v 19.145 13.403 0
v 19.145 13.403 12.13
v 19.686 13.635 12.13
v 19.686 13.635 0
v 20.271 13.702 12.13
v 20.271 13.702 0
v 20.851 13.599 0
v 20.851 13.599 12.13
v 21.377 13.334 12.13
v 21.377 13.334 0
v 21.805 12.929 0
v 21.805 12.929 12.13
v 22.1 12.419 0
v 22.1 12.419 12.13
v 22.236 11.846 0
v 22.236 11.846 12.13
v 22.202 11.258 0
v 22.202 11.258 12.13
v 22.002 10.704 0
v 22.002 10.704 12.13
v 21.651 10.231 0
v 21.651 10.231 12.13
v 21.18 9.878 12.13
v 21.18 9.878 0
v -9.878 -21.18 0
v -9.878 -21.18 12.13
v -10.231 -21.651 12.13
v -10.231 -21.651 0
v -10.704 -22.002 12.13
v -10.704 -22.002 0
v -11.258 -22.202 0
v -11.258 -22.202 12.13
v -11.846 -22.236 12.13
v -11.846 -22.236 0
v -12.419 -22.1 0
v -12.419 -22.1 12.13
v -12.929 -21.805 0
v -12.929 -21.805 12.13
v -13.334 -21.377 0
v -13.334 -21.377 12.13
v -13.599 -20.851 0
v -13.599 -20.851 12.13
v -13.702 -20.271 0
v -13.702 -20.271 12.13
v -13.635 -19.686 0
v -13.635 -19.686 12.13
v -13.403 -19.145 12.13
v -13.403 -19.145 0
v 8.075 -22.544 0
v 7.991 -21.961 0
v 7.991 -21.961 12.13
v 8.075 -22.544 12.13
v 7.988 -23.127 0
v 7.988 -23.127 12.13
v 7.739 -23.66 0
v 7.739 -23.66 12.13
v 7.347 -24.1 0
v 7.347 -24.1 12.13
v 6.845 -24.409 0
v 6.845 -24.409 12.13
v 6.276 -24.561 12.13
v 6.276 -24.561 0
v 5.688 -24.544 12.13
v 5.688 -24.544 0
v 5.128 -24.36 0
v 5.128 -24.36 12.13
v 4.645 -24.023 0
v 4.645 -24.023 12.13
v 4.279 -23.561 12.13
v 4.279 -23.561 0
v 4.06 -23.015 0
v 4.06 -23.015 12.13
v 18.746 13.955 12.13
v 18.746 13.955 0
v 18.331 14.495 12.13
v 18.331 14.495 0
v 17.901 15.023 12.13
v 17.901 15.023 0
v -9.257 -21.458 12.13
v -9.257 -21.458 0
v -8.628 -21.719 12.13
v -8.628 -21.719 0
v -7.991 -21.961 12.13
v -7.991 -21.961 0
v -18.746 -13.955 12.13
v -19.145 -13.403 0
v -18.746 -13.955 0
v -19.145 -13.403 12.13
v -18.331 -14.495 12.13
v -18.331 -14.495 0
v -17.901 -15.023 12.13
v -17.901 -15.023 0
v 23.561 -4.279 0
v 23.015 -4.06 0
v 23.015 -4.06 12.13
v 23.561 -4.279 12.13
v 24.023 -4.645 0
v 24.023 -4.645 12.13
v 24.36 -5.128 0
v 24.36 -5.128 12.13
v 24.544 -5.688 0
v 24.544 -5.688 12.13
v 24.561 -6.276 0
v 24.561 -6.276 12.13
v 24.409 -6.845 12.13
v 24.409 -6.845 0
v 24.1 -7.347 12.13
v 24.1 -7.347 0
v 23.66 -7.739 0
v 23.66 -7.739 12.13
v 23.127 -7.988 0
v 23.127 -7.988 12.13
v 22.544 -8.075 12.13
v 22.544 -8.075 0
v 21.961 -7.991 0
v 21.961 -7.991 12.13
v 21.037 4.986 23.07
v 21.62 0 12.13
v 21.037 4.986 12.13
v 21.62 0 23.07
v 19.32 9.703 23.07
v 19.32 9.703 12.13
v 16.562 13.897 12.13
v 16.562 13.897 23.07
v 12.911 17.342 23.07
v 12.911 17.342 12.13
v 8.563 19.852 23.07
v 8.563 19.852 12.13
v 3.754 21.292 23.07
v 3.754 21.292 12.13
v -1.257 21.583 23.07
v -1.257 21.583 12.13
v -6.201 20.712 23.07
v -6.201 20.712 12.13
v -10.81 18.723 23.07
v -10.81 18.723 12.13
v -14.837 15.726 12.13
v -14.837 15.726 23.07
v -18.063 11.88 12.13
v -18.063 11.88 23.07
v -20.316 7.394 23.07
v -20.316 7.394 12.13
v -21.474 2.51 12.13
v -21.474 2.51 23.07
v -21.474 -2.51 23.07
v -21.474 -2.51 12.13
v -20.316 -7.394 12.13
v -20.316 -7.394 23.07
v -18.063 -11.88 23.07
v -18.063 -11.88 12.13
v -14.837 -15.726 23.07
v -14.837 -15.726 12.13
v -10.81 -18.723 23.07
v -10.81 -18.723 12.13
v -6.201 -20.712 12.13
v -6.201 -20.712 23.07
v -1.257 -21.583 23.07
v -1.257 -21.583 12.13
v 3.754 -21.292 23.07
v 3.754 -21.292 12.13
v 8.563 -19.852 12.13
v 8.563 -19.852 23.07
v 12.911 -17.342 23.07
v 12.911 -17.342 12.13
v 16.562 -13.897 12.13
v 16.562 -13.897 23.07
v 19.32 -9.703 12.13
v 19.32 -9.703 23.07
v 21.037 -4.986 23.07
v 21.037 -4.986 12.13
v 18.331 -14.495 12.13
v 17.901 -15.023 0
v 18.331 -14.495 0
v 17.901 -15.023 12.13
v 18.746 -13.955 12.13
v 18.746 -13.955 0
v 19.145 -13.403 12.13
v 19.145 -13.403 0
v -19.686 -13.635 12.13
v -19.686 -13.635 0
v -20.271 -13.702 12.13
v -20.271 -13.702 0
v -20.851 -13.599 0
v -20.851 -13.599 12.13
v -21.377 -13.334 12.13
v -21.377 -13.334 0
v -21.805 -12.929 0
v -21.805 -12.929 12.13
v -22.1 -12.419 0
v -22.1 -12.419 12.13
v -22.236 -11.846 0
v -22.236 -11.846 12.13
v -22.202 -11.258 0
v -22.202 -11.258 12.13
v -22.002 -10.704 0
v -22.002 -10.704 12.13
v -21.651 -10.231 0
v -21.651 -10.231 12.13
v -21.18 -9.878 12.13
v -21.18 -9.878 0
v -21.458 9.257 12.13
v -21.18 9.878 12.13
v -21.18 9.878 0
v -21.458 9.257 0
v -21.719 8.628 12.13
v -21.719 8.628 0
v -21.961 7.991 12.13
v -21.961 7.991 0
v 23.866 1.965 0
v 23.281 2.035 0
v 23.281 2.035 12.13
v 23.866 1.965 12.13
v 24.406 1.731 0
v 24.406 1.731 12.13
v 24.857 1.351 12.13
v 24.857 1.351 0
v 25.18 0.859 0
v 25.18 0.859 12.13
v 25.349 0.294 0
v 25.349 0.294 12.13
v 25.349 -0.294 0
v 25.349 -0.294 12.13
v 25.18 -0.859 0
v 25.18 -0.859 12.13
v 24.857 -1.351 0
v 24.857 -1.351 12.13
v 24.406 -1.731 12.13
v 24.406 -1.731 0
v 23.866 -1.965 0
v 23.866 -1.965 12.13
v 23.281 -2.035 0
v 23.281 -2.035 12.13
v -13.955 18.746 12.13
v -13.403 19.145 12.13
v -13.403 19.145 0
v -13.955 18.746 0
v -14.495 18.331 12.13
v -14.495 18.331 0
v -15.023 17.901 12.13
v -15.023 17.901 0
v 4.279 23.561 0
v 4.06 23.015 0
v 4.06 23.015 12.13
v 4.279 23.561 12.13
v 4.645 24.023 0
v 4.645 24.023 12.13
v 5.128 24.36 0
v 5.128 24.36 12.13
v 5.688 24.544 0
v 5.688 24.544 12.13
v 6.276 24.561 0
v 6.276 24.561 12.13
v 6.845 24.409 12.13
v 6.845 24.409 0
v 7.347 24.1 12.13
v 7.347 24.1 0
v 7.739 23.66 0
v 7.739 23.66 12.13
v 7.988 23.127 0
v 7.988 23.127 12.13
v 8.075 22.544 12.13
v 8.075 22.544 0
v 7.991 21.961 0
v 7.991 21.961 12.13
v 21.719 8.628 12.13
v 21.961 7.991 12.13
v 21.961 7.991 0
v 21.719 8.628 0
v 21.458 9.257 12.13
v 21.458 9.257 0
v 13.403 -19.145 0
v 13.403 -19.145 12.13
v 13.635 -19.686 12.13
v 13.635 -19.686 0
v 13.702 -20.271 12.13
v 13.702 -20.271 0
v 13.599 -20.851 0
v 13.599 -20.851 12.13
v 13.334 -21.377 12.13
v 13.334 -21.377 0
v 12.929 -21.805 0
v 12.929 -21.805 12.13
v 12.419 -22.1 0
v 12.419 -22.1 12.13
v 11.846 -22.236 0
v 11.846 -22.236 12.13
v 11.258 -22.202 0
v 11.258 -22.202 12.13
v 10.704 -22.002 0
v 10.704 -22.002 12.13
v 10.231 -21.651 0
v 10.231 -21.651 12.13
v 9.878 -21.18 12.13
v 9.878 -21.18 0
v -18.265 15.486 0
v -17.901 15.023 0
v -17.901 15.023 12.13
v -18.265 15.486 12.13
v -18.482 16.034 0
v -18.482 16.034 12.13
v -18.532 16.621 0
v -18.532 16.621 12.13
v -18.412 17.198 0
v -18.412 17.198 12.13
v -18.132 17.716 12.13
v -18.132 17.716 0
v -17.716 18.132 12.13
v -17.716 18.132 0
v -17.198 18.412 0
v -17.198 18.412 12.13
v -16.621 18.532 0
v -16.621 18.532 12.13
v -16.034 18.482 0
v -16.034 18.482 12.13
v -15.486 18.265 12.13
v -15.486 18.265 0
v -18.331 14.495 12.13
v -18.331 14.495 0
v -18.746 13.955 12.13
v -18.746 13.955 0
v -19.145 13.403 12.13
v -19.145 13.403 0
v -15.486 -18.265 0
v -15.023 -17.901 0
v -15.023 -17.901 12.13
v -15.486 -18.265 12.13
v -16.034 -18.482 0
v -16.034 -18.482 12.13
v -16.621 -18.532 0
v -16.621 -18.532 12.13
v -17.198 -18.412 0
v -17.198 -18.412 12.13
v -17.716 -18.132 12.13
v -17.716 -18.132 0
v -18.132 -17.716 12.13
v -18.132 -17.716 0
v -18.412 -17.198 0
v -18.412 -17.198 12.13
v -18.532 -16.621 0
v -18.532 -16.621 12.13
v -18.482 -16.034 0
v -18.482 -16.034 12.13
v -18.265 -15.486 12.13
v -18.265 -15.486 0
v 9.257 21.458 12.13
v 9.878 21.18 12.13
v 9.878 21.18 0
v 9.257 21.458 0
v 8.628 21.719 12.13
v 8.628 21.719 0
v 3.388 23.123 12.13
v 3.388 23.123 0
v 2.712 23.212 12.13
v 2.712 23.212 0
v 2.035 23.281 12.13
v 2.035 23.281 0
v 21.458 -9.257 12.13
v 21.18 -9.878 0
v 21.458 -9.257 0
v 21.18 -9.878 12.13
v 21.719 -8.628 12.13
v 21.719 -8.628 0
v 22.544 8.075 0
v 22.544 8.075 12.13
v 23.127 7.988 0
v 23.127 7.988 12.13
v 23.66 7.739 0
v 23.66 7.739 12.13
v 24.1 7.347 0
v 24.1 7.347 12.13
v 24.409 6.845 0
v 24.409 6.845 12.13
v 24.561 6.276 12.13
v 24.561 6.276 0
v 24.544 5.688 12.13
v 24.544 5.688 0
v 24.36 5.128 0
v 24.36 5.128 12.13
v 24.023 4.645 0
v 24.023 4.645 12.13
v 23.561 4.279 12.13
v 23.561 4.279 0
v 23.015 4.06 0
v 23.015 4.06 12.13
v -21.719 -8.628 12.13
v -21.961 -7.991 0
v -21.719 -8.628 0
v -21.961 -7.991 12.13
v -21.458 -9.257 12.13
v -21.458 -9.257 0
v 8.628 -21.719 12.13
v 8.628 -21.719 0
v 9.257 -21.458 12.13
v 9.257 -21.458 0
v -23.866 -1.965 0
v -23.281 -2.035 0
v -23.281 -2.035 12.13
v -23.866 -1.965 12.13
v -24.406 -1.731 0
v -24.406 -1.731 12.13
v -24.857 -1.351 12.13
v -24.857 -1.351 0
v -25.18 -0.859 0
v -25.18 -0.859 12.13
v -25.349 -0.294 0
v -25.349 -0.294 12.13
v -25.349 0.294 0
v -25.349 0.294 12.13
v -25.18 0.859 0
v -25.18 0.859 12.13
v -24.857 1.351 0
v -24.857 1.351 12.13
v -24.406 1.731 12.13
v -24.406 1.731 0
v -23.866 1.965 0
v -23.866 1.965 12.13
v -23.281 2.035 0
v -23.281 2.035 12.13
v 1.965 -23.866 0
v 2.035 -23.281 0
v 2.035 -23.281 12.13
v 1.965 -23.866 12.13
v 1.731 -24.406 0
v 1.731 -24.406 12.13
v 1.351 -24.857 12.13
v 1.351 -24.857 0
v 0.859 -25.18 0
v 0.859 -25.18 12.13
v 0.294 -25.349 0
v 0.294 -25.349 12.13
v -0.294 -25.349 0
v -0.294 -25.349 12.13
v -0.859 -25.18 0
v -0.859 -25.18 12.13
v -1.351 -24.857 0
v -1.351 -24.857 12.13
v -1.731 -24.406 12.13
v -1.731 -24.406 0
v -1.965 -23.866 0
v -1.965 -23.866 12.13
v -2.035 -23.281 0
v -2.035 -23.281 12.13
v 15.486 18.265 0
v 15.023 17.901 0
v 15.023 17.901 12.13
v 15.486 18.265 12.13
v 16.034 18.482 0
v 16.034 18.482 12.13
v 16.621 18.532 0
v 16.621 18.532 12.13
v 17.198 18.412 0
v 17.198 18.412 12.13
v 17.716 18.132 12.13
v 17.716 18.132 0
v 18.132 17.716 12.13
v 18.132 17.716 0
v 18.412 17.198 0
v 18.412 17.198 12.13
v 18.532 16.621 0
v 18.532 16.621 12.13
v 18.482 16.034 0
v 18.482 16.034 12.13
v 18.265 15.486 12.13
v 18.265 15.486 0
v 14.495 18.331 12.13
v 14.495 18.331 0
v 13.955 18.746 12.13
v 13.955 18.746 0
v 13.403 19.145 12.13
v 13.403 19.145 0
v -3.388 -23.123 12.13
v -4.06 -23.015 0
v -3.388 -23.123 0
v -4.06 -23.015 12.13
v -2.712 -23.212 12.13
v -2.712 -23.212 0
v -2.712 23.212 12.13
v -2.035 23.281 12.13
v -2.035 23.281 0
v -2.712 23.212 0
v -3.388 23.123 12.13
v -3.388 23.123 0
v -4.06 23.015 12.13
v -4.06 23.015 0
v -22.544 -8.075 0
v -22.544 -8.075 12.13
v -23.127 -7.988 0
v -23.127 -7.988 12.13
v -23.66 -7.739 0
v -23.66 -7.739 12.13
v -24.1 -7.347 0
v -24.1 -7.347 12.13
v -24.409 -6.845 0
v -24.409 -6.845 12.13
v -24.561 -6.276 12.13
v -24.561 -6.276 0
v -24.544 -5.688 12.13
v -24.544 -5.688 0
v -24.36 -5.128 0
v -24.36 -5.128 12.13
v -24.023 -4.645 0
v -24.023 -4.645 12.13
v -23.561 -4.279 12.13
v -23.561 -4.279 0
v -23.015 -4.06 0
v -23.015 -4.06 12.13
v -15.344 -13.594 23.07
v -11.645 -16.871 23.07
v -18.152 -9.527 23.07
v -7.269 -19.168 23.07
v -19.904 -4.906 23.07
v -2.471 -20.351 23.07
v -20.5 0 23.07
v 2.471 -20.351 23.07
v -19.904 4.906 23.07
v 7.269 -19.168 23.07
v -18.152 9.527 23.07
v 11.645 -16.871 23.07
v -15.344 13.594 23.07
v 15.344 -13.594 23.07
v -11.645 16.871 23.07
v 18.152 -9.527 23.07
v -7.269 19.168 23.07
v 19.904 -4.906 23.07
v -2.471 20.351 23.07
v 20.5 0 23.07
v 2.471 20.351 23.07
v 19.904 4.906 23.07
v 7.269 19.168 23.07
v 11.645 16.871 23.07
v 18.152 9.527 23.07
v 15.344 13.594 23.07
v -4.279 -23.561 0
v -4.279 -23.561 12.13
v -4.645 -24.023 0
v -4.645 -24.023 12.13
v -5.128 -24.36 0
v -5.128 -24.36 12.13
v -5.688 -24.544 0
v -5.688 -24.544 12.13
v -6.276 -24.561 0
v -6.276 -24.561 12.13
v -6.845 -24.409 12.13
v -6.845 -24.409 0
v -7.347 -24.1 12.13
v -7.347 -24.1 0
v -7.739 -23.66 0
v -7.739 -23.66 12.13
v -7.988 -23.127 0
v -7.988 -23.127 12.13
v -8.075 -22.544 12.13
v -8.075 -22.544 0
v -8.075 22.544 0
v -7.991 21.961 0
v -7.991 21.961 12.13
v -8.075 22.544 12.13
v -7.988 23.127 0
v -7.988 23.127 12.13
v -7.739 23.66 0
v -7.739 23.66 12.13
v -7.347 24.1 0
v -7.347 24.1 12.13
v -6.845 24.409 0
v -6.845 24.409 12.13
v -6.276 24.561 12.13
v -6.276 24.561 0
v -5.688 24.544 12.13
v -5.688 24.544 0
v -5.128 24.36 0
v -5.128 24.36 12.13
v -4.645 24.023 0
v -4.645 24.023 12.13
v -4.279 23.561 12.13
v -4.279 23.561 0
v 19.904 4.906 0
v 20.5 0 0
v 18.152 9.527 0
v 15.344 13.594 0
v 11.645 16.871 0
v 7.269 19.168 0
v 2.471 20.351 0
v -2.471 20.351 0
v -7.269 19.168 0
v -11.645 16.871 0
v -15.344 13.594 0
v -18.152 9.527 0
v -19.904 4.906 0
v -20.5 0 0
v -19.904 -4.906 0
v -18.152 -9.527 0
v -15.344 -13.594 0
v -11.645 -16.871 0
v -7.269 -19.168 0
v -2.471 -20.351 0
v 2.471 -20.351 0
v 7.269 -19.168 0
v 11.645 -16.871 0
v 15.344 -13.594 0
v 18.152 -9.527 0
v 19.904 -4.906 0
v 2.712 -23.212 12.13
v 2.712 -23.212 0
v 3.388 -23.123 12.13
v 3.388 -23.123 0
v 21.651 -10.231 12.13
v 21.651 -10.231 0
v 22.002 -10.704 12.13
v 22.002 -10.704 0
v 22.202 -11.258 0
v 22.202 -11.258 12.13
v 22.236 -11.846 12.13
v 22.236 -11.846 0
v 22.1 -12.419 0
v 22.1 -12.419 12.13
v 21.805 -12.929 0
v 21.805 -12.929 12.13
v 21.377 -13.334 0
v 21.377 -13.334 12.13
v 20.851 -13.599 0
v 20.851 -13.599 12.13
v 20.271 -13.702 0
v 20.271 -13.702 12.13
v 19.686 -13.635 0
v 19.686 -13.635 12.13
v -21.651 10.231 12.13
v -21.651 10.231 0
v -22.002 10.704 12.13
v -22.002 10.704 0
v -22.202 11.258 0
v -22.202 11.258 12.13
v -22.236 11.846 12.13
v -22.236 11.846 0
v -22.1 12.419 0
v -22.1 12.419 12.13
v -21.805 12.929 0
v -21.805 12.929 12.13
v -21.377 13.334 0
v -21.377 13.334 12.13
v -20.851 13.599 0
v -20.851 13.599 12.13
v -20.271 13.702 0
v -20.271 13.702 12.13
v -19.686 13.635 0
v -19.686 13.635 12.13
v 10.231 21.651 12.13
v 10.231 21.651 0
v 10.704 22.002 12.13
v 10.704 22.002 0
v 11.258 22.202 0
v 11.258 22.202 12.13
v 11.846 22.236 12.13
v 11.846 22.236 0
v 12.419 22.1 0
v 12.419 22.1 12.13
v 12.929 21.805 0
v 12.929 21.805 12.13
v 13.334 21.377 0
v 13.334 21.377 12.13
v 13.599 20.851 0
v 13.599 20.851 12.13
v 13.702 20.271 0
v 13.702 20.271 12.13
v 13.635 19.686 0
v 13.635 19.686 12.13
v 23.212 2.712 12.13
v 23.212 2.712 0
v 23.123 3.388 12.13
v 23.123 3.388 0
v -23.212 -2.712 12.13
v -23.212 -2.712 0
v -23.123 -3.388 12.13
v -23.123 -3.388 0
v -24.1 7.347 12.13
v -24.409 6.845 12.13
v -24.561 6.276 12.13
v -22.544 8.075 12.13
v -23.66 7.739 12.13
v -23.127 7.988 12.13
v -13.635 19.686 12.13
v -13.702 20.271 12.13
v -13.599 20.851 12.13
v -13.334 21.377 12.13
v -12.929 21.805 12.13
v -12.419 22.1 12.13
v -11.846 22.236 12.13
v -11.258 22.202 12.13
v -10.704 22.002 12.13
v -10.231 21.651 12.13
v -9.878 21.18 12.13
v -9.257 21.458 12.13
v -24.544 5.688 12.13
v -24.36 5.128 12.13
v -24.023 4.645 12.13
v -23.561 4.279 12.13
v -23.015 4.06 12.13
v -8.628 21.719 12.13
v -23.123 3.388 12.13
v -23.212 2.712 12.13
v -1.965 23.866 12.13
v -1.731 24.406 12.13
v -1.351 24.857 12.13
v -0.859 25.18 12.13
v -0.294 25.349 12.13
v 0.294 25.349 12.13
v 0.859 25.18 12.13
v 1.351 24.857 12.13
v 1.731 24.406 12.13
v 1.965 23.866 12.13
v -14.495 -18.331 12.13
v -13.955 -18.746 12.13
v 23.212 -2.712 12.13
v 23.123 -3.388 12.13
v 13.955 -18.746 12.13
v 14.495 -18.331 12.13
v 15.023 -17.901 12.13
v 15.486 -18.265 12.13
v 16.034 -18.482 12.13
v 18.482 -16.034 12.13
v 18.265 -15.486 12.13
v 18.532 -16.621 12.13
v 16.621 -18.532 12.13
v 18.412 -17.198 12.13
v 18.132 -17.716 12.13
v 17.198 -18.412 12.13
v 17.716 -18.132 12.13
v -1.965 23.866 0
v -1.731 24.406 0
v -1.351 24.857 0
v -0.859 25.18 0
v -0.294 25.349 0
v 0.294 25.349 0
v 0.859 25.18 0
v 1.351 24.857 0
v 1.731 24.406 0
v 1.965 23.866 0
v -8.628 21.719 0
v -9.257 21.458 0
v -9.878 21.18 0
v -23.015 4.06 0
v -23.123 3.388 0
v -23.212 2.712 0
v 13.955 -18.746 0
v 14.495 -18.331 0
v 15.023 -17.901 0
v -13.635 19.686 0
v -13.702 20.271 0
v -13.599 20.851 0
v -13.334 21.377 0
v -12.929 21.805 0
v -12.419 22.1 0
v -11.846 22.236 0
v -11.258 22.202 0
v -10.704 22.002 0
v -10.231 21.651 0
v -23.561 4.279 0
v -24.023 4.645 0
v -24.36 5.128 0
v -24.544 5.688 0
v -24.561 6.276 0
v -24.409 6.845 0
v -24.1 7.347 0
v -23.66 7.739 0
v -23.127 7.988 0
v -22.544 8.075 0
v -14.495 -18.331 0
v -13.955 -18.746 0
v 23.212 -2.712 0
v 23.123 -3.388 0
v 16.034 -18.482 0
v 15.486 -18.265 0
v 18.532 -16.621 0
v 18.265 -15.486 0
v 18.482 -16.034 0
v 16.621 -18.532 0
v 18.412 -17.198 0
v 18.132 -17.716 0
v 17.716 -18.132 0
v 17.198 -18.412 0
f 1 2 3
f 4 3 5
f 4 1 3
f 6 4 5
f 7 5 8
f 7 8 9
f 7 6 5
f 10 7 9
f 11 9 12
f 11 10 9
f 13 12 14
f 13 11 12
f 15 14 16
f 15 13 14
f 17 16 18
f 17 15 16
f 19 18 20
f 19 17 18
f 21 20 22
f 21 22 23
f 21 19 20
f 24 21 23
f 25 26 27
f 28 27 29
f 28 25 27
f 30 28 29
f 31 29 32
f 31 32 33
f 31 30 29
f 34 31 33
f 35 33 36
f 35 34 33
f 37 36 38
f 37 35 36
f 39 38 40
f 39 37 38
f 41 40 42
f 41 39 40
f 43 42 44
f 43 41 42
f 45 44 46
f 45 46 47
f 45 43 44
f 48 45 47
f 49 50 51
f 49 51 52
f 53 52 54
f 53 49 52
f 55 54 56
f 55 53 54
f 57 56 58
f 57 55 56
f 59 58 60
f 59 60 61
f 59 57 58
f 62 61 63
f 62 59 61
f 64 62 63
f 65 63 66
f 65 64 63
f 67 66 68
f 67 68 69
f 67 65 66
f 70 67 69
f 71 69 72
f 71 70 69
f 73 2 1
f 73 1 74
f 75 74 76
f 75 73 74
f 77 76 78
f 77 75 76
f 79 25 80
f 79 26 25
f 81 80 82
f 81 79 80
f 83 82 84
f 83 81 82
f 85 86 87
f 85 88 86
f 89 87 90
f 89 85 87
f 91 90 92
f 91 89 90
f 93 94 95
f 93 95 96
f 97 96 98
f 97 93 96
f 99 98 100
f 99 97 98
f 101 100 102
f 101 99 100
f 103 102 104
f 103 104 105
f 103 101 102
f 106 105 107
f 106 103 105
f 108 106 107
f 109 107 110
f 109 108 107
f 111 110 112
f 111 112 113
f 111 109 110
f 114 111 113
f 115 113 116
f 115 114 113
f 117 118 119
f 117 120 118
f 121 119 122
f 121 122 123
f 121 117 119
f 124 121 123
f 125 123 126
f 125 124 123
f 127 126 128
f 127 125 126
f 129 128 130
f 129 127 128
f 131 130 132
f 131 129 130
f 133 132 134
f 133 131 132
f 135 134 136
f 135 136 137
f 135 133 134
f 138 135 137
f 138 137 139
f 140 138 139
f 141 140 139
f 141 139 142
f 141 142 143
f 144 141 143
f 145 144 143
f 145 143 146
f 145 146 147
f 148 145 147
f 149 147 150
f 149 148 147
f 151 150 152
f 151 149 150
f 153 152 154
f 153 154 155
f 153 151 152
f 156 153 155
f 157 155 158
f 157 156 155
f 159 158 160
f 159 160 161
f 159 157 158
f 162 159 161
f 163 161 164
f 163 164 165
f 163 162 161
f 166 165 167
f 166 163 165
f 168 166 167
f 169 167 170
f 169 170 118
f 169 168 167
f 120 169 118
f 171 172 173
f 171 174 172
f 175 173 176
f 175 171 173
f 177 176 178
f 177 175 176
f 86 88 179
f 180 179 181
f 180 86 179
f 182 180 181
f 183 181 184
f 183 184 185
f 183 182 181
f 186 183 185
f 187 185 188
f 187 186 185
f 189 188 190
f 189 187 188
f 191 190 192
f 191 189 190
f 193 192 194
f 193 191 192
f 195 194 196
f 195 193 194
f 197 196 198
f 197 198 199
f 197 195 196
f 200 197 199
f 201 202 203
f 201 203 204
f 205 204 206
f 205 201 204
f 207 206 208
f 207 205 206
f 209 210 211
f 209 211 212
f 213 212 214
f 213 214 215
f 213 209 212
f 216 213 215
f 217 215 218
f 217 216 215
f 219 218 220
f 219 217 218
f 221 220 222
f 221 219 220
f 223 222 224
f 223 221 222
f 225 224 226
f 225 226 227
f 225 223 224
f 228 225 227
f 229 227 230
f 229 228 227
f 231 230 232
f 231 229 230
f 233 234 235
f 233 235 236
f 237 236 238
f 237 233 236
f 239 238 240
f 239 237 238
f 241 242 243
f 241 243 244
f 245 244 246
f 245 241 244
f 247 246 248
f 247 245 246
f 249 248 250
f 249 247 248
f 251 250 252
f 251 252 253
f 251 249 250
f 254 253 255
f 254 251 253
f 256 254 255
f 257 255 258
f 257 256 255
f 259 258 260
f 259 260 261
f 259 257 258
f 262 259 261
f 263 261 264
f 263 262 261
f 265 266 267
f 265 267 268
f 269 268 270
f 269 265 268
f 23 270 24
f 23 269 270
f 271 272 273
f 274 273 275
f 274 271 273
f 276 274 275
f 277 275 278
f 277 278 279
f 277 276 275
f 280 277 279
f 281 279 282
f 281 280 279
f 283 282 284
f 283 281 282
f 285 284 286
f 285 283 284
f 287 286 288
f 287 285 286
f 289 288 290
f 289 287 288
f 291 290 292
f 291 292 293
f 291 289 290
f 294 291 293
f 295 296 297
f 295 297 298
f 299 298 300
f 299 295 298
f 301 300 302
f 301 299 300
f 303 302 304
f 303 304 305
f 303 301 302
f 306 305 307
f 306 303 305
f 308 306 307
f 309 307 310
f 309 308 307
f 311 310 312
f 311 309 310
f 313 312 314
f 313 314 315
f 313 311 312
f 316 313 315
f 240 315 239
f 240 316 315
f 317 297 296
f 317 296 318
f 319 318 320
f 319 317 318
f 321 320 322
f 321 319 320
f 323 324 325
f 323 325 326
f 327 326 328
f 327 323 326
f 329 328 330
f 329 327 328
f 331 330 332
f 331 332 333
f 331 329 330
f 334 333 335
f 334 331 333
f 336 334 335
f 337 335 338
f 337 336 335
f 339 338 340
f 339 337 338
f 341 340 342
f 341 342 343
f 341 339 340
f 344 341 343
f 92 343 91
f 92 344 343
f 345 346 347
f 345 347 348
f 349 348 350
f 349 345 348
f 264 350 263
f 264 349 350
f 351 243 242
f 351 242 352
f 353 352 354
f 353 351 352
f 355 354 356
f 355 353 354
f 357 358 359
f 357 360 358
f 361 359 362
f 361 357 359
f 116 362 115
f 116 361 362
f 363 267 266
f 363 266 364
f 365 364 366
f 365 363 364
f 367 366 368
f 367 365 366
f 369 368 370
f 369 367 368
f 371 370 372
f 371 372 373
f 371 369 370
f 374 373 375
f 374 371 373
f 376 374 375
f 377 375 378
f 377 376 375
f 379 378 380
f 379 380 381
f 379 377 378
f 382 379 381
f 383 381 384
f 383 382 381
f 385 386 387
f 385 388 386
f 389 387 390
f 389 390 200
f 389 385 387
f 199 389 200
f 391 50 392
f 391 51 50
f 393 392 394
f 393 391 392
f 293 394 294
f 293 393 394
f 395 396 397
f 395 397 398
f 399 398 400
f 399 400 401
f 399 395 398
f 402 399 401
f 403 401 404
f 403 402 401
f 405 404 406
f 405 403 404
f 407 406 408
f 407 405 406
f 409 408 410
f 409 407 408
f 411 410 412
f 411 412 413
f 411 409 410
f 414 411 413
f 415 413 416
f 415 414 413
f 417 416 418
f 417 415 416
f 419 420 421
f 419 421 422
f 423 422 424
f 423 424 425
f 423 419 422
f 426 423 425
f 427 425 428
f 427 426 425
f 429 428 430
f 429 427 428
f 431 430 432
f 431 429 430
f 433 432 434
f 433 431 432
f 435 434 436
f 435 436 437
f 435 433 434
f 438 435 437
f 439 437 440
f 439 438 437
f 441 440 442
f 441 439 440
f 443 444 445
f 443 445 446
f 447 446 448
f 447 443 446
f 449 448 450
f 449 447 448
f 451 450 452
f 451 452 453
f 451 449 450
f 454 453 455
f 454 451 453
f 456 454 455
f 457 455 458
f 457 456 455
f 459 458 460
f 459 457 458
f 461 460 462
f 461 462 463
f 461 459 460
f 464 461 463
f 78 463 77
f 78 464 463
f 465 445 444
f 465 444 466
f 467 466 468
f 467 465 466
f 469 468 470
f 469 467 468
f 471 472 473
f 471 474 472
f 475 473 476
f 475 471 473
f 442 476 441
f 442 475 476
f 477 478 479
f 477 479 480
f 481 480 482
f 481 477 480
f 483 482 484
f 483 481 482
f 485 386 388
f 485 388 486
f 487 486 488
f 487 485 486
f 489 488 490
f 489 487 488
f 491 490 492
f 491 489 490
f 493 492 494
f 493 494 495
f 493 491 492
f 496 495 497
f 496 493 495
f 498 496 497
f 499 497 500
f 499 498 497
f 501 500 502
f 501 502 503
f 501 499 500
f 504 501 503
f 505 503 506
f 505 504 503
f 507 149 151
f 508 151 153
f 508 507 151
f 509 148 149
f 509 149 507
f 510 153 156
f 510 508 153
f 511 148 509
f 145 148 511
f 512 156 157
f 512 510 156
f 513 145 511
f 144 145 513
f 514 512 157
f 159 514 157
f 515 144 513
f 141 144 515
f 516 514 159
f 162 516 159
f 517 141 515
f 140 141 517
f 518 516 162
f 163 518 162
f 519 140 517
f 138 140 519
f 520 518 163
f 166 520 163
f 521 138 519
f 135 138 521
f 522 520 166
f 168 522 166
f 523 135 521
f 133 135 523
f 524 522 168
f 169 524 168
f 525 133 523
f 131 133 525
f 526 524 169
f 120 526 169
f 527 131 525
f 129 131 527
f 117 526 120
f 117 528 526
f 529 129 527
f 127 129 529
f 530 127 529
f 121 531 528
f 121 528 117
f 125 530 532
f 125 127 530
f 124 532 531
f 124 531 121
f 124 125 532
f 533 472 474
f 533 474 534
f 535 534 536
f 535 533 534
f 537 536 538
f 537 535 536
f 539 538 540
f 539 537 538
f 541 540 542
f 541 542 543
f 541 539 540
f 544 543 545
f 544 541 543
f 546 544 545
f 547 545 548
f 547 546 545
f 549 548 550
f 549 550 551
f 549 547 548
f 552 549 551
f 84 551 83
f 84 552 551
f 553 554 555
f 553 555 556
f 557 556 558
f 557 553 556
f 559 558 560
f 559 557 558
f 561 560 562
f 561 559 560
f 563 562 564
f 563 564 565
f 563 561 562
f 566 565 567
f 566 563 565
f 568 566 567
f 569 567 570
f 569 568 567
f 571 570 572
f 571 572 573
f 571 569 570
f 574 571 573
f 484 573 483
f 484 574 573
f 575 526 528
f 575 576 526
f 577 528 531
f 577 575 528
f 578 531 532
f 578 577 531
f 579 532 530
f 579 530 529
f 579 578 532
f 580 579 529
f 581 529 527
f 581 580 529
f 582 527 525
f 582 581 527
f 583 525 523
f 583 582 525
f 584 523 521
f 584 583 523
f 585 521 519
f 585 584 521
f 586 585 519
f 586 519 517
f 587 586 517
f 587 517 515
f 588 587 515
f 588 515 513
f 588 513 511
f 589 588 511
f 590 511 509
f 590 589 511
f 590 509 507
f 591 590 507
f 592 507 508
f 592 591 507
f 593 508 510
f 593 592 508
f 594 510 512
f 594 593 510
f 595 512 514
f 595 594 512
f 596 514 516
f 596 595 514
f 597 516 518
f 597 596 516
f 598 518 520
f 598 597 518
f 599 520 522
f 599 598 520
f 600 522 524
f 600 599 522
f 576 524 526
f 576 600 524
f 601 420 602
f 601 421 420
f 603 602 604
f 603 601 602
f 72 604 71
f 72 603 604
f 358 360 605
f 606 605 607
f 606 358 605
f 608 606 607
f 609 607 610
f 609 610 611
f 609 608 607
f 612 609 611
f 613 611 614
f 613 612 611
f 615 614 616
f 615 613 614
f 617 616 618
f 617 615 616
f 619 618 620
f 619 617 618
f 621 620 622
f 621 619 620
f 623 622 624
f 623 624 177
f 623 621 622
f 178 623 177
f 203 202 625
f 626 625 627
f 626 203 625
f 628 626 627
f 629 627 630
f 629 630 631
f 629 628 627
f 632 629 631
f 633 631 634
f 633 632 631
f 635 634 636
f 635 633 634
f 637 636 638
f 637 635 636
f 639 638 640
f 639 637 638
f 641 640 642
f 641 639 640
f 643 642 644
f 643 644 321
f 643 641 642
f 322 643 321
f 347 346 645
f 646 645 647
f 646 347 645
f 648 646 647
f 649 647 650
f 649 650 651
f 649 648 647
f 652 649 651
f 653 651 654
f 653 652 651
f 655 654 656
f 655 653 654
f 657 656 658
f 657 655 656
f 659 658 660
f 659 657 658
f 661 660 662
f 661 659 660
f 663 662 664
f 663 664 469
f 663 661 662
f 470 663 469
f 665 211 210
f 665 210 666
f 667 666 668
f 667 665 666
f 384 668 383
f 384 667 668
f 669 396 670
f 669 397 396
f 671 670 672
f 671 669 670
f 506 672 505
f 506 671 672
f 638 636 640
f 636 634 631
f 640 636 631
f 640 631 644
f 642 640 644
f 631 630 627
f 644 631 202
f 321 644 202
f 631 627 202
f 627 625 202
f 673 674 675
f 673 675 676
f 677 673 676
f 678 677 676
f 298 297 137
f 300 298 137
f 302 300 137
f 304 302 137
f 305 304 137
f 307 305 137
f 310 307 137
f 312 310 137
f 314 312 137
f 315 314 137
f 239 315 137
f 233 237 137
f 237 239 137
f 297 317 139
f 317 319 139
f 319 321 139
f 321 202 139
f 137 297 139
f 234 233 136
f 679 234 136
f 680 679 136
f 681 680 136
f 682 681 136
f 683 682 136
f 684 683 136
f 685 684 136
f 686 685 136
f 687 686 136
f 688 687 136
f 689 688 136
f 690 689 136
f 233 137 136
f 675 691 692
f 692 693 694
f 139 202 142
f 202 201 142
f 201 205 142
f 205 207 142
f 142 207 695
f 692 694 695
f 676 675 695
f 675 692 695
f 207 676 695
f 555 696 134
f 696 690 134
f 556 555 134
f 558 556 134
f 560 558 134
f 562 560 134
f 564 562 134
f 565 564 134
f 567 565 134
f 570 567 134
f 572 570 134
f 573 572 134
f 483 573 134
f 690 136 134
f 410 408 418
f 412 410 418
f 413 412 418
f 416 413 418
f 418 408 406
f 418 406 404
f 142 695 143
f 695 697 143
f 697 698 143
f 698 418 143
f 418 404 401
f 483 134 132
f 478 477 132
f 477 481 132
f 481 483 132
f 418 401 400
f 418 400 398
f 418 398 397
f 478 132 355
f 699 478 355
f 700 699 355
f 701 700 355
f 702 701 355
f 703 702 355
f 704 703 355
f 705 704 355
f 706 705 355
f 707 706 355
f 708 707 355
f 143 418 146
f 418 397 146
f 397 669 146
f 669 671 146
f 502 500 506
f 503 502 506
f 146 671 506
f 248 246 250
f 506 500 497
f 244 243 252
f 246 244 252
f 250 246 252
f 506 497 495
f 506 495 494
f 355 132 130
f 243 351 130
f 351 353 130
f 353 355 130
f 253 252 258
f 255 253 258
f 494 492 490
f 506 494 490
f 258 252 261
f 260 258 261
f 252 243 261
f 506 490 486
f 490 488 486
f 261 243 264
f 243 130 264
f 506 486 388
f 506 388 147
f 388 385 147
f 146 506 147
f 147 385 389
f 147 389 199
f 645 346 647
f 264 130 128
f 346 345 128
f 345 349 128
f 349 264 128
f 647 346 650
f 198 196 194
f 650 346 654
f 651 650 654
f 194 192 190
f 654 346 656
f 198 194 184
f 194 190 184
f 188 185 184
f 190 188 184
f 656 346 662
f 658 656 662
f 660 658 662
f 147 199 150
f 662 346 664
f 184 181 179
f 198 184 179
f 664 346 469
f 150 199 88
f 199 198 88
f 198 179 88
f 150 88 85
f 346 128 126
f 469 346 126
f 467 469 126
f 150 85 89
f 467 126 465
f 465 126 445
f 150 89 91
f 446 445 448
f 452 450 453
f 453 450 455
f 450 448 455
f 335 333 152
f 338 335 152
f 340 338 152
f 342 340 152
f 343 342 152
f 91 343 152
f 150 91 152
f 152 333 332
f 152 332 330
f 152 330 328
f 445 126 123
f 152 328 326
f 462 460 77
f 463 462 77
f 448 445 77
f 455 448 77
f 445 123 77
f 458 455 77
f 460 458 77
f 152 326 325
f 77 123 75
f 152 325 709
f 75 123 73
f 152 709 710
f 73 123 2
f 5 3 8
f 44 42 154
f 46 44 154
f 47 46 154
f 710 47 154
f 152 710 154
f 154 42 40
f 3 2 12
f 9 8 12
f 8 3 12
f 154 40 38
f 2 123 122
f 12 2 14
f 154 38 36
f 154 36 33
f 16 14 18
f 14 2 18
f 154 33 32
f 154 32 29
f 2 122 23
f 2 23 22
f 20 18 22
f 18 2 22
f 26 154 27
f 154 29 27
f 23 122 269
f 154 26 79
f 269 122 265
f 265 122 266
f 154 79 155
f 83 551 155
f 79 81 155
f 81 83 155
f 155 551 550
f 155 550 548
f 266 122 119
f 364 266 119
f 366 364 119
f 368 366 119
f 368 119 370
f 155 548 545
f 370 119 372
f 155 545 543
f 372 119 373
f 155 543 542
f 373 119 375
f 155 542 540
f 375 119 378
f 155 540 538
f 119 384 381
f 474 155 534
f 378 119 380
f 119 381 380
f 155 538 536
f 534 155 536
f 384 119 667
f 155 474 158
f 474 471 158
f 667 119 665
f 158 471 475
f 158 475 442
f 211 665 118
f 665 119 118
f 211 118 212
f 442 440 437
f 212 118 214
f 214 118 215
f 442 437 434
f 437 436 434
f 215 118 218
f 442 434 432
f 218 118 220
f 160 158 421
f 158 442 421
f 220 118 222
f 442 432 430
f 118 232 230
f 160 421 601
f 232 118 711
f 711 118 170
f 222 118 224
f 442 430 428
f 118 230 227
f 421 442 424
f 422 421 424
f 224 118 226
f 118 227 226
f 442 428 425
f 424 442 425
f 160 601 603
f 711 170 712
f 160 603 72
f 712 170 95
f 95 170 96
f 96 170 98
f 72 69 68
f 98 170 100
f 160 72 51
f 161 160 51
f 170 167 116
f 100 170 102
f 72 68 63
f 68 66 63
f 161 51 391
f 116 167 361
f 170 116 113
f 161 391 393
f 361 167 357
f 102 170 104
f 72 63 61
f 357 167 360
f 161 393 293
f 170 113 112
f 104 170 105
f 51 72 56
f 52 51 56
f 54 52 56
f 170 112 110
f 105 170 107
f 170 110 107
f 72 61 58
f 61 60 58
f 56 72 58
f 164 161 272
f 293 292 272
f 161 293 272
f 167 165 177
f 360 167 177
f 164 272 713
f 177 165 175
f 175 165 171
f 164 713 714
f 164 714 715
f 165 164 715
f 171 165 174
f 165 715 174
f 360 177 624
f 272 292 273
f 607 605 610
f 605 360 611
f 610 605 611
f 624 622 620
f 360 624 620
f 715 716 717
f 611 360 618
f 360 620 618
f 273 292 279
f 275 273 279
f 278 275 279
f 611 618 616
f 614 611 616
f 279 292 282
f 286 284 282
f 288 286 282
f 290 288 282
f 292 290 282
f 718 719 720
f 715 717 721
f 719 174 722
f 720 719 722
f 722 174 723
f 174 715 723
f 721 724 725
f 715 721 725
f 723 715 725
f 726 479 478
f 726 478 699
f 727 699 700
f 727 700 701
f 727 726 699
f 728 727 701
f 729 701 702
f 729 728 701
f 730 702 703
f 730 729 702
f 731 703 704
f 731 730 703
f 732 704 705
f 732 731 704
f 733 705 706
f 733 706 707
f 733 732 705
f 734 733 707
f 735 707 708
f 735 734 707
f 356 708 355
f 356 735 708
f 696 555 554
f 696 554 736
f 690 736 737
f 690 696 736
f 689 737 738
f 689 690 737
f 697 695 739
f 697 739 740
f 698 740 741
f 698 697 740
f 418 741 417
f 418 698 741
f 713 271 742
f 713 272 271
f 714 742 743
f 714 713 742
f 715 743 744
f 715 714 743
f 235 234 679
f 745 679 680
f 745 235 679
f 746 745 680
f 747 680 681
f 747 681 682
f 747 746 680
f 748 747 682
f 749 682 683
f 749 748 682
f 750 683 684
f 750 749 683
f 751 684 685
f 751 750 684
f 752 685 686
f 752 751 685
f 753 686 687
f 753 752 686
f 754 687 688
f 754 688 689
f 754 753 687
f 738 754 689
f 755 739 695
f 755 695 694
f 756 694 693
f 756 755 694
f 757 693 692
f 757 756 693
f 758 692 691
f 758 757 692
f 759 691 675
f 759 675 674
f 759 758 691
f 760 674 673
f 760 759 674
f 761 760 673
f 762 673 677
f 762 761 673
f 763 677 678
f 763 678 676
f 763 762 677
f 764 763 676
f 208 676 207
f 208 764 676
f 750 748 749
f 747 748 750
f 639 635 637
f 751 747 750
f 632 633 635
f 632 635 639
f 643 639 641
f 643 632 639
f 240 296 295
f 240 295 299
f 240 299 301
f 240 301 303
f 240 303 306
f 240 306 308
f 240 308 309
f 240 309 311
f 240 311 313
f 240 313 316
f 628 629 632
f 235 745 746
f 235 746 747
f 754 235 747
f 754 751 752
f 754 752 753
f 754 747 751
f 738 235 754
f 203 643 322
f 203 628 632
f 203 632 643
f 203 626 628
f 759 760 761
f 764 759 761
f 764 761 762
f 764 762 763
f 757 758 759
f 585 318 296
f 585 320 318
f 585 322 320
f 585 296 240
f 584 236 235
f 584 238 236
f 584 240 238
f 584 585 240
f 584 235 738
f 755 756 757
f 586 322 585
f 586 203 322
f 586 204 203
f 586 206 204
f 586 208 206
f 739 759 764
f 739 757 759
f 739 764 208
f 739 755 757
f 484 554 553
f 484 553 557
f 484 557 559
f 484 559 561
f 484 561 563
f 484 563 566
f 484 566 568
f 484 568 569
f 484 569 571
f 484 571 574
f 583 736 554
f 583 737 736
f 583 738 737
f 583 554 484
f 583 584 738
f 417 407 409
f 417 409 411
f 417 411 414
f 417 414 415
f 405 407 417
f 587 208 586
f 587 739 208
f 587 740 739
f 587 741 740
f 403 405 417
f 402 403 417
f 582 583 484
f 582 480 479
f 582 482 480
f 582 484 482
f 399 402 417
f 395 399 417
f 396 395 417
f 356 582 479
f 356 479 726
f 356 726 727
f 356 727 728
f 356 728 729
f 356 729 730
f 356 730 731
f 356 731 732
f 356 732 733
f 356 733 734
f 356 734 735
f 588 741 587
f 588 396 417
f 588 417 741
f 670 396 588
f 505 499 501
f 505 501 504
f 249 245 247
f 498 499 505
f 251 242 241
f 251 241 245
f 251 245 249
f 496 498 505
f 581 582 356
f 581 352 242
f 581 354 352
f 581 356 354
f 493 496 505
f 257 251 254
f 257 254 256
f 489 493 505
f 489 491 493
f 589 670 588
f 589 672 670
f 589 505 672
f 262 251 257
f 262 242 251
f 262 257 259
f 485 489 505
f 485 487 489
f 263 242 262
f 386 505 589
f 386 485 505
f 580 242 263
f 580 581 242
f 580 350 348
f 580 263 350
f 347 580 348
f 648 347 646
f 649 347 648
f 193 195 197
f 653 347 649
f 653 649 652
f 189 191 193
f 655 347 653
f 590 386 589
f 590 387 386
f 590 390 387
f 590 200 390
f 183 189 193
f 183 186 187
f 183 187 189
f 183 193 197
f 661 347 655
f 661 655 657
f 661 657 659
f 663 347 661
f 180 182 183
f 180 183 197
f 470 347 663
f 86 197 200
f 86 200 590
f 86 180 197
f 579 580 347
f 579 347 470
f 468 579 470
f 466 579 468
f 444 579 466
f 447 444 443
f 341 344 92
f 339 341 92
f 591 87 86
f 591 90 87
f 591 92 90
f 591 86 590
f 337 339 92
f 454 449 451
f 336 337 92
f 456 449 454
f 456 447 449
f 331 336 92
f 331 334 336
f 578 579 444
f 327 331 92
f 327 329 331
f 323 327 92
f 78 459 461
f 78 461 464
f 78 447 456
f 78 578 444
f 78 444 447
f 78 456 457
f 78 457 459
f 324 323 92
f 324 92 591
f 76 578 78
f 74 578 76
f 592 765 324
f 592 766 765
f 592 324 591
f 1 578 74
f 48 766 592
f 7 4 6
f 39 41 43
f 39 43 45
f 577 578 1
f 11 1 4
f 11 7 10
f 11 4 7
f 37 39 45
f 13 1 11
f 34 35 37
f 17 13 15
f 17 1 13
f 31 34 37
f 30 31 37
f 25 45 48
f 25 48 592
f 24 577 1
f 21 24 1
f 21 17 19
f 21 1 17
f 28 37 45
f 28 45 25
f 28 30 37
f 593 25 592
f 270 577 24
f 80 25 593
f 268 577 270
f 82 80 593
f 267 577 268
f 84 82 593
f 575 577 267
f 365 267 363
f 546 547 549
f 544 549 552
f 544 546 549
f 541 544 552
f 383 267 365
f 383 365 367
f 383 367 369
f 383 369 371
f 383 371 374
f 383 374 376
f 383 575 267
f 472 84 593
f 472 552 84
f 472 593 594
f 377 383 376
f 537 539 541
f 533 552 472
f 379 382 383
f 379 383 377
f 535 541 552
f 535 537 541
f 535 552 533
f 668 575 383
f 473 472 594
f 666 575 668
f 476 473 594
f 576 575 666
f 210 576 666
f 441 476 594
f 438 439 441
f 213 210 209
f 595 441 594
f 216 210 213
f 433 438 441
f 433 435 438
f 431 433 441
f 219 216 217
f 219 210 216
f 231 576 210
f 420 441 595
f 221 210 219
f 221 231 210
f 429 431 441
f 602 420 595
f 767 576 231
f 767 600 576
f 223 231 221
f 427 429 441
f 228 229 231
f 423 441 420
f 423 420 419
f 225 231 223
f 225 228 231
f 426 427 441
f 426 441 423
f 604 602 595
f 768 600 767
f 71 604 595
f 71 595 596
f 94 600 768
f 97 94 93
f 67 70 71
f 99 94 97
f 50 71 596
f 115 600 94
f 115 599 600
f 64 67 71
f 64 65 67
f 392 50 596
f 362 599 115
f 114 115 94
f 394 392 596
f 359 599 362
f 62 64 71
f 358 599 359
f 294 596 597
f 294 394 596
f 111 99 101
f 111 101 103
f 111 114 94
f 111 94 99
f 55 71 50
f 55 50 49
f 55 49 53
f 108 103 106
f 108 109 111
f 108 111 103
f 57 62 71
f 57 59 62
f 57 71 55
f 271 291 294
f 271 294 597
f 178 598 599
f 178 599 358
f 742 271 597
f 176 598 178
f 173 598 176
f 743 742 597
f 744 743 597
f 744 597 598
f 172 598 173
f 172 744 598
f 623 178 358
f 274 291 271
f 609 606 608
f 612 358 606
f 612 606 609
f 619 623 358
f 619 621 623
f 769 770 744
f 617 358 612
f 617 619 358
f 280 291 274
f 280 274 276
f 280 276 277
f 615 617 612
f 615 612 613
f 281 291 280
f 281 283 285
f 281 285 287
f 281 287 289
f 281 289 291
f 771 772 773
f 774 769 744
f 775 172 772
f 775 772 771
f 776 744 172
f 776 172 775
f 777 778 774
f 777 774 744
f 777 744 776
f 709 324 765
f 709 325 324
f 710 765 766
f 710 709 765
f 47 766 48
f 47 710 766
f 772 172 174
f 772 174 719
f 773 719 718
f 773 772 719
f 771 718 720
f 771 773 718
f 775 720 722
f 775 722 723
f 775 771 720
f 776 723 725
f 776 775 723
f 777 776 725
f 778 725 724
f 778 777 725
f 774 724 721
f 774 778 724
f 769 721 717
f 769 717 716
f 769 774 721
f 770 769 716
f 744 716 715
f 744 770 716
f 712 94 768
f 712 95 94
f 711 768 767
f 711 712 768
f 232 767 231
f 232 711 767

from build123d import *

# Parameters (mm, degrees)
F3_DEPTH = 12.13


with BuildPart() as f1:
    # F0 (on Front) → F1 (revolve)
    with BuildSketch(Plane.XZ):
        Polygon((20.5, 23.07), (20.5, 0), (23.37, 0), (23.37, 12.13), (21.62, 12.13), (21.62, 23.07), align=None)
    revolve(axis=Axis((0, 0, 6.4205313101), (0, 0, 1)))

    # F2 (on face) → F3 (join)
    with BuildSketch(Plane(origin=(0, 0, 0), x_dir=(1, 0, 0), z_dir=(0, 0, -1))):
        with BuildLine():
            ThreePointArc((-2.035, 23.2812301007), (0, 23.37), (2.035, 23.2812301007))
            ThreePointArc((2.035, 23.2812301007), (0, 25.37), (-2.035, 23.2812301007))
        make_face()
        with BuildLine():
            ThreePointArc((-7.9912848, 21.9612446652), (-6.048601084, 22.5736865604), (-4.059966687, 23.0146381788))
            ThreePointArc((-4.059966687, 23.0146381788), (-6.5662391743, 24.505538213), (-7.9912848, 21.9612446652))
        make_face()
        with BuildLine():
            ThreePointArc((-13.402976747, 19.1446366985), (-11.685, 20.2390136864), (-9.8782533536, 21.1796366985))
            ThreePointArc((-9.8782533536, 21.1796366985), (-12.685, 21.971064494), (-13.402976747, 19.1446366985))
        make_face()
        with BuildLine():
            ThreePointArc((-17.9012779783, 15.0233533788), (-16.5250854763, 16.5250854763), (-15.0233533788, 17.9012779783))
            ThreePointArc((-15.0233533788, 17.9012779783), (-17.9392990387, 17.9392990387), (-17.9012779783, 15.0233533788))
        make_face()
        with BuildLine():
            ThreePointArc((-21.1796366985, 9.8782533536), (-20.2390136864, 11.685), (-19.1446366985, 13.402976747))
            ThreePointArc((-19.1446366985, 13.402976747), (-21.971064494, 12.685), (-21.1796366985, 9.8782533536))
        make_face()
        with BuildLine():
            ThreePointArc((-23.0146381788, 4.059966687), (-22.5736865604, 6.048601084), (-21.9612446652, 7.9912848))
            ThreePointArc((-21.9612446652, 7.9912848), (-24.505538213, 6.5662391743), (-23.0146381788, 4.059966687))
        make_face()
        with BuildLine():
            ThreePointArc((-23.2812301007, -2.035), (-23.37, 0), (-23.2812301007, 2.035))
            ThreePointArc((-23.2812301007, 2.035), (-25.37, 0), (-23.2812301007, -2.035))
        make_face()
        with BuildLine():
            ThreePointArc((-23.0146381788, -4.059966687), (-24.505538213, -6.5662391743), (-21.9612446652, -7.9912848))
            ThreePointArc((-21.9612446652, -7.9912848), (-22.5736865604, -6.048601084), (-23.0146381788, -4.059966687))
        make_face()
        with BuildLine():
            ThreePointArc((-21.1796366985, -9.8782533536), (-21.971064494, -12.685), (-19.1446366985, -13.402976747))
            ThreePointArc((-19.1446366985, -13.402976747), (-20.2390136864, -11.685), (-21.1796366985, -9.8782533536))
        make_face()
        with BuildLine():
            ThreePointArc((-17.9012779783, -15.0233533788), (-17.9392990387, -17.9392990387), (-15.0233533788, -17.9012779783))
            ThreePointArc((-15.0233533788, -17.9012779783), (-16.5250854763, -16.5250854763), (-17.9012779783, -15.0233533788))
        make_face()
        with BuildLine():
            ThreePointArc((-13.402976747, -19.1446366985), (-12.685, -21.971064494), (-9.8782533536, -21.1796366985))
            ThreePointArc((-9.8782533536, -21.1796366985), (-11.685, -20.2390136864), (-13.402976747, -19.1446366985))
        make_face()
        with BuildLine():
            ThreePointArc((-7.9912848, -21.9612446652), (-6.5662391743, -24.505538213), (-4.059966687, -23.0146381788))
            ThreePointArc((-4.059966687, -23.0146381788), (-6.048601084, -22.5736865604), (-7.9912848, -21.9612446652))
        make_face()
        with BuildLine():
            ThreePointArc((-2.035, -23.2812301007), (0, -25.37), (2.035, -23.2812301007))
            ThreePointArc((2.035, -23.2812301007), (0, -23.37), (-2.035, -23.2812301007))
        make_face()
        with BuildLine():
            ThreePointArc((4.059966687, -23.0146381788), (6.5662391743, -24.505538213), (7.9912848, -21.9612446652))
            ThreePointArc((7.9912848, -21.9612446652), (6.048601084, -22.5736865604), (4.059966687, -23.0146381788))
        make_face()
        with BuildLine():
            ThreePointArc((9.8782533536, -21.1796366985), (12.685, -21.971064494), (13.402976747, -19.1446366985))
            ThreePointArc((13.402976747, -19.1446366985), (11.685, -20.2390136864), (9.8782533536, -21.1796366985))
        make_face()
        with BuildLine():
            ThreePointArc((15.0233533788, -17.9012779783), (17.9392990387, -17.9392990387), (17.9012779783, -15.0233533788))
            ThreePointArc((17.9012779783, -15.0233533788), (16.5250854763, -16.5250854763), (15.0233533788, -17.9012779783))
        make_face()
        with BuildLine():
            ThreePointArc((19.1446366985, -13.402976747), (21.971064494, -12.685), (21.1796366985, -9.8782533536))
            ThreePointArc((21.1796366985, -9.8782533536), (20.2390136864, -11.685), (19.1446366985, -13.402976747))
        make_face()
        with BuildLine():
            ThreePointArc((21.9612446652, -7.9912848), (24.505538213, -6.5662391743), (23.0146381788, -4.059966687))
            ThreePointArc((23.0146381788, -4.059966687), (22.5736865604, -6.048601084), (21.9612446652, -7.9912848))
        make_face()
        with BuildLine():
            ThreePointArc((23.2812301007, 2.035), (23.347796978, 1.0184676106), (23.37, 0))
            ThreePointArc((23.37, 0), (23.347796978, -1.0184676106), (23.2812301007, -2.035))
            ThreePointArc((23.2812301007, -2.035), (25.37, 0), (23.2812301007, 2.035))
        make_face()
        with BuildLine():
            ThreePointArc((21.9612446652, 7.9912848), (22.5736865604, 6.048601084), (23.0146381788, 4.059966687))
            ThreePointArc((23.0146381788, 4.059966687), (24.505538213, 6.5662391743), (21.9612446652, 7.9912848))
        make_face()
        with BuildLine():
            ThreePointArc((19.1446366985, 13.402976747), (20.2390136864, 11.685), (21.1796366985, 9.8782533536))
            ThreePointArc((21.1796366985, 9.8782533536), (21.971064494, 12.685), (19.1446366985, 13.402976747))
        make_face()
        with BuildLine():
            ThreePointArc((15.0233533788, 17.9012779783), (16.5250854763, 16.5250854763), (17.9012779783, 15.0233533788))
            ThreePointArc((17.9012779783, 15.0233533788), (17.9392990387, 17.9392990387), (15.0233533788, 17.9012779783))
        make_face()
        with BuildLine():
            ThreePointArc((9.8782533536, 21.1796366985), (11.685, 20.2390136864), (13.402976747, 19.1446366985))
            ThreePointArc((13.402976747, 19.1446366985), (12.685, 21.971064494), (9.8782533536, 21.1796366985))
        make_face()
        with BuildLine():
            ThreePointArc((4.059966687, 23.0146381788), (6.048601084, 22.5736865604), (7.9912848, 21.9612446652))
            ThreePointArc((7.9912848, 21.9612446652), (6.5662391743, 24.505538213), (4.059966687, 23.0146381788))
        make_face()
    extrude(amount=-F3_DEPTH)


solid = f1.part
